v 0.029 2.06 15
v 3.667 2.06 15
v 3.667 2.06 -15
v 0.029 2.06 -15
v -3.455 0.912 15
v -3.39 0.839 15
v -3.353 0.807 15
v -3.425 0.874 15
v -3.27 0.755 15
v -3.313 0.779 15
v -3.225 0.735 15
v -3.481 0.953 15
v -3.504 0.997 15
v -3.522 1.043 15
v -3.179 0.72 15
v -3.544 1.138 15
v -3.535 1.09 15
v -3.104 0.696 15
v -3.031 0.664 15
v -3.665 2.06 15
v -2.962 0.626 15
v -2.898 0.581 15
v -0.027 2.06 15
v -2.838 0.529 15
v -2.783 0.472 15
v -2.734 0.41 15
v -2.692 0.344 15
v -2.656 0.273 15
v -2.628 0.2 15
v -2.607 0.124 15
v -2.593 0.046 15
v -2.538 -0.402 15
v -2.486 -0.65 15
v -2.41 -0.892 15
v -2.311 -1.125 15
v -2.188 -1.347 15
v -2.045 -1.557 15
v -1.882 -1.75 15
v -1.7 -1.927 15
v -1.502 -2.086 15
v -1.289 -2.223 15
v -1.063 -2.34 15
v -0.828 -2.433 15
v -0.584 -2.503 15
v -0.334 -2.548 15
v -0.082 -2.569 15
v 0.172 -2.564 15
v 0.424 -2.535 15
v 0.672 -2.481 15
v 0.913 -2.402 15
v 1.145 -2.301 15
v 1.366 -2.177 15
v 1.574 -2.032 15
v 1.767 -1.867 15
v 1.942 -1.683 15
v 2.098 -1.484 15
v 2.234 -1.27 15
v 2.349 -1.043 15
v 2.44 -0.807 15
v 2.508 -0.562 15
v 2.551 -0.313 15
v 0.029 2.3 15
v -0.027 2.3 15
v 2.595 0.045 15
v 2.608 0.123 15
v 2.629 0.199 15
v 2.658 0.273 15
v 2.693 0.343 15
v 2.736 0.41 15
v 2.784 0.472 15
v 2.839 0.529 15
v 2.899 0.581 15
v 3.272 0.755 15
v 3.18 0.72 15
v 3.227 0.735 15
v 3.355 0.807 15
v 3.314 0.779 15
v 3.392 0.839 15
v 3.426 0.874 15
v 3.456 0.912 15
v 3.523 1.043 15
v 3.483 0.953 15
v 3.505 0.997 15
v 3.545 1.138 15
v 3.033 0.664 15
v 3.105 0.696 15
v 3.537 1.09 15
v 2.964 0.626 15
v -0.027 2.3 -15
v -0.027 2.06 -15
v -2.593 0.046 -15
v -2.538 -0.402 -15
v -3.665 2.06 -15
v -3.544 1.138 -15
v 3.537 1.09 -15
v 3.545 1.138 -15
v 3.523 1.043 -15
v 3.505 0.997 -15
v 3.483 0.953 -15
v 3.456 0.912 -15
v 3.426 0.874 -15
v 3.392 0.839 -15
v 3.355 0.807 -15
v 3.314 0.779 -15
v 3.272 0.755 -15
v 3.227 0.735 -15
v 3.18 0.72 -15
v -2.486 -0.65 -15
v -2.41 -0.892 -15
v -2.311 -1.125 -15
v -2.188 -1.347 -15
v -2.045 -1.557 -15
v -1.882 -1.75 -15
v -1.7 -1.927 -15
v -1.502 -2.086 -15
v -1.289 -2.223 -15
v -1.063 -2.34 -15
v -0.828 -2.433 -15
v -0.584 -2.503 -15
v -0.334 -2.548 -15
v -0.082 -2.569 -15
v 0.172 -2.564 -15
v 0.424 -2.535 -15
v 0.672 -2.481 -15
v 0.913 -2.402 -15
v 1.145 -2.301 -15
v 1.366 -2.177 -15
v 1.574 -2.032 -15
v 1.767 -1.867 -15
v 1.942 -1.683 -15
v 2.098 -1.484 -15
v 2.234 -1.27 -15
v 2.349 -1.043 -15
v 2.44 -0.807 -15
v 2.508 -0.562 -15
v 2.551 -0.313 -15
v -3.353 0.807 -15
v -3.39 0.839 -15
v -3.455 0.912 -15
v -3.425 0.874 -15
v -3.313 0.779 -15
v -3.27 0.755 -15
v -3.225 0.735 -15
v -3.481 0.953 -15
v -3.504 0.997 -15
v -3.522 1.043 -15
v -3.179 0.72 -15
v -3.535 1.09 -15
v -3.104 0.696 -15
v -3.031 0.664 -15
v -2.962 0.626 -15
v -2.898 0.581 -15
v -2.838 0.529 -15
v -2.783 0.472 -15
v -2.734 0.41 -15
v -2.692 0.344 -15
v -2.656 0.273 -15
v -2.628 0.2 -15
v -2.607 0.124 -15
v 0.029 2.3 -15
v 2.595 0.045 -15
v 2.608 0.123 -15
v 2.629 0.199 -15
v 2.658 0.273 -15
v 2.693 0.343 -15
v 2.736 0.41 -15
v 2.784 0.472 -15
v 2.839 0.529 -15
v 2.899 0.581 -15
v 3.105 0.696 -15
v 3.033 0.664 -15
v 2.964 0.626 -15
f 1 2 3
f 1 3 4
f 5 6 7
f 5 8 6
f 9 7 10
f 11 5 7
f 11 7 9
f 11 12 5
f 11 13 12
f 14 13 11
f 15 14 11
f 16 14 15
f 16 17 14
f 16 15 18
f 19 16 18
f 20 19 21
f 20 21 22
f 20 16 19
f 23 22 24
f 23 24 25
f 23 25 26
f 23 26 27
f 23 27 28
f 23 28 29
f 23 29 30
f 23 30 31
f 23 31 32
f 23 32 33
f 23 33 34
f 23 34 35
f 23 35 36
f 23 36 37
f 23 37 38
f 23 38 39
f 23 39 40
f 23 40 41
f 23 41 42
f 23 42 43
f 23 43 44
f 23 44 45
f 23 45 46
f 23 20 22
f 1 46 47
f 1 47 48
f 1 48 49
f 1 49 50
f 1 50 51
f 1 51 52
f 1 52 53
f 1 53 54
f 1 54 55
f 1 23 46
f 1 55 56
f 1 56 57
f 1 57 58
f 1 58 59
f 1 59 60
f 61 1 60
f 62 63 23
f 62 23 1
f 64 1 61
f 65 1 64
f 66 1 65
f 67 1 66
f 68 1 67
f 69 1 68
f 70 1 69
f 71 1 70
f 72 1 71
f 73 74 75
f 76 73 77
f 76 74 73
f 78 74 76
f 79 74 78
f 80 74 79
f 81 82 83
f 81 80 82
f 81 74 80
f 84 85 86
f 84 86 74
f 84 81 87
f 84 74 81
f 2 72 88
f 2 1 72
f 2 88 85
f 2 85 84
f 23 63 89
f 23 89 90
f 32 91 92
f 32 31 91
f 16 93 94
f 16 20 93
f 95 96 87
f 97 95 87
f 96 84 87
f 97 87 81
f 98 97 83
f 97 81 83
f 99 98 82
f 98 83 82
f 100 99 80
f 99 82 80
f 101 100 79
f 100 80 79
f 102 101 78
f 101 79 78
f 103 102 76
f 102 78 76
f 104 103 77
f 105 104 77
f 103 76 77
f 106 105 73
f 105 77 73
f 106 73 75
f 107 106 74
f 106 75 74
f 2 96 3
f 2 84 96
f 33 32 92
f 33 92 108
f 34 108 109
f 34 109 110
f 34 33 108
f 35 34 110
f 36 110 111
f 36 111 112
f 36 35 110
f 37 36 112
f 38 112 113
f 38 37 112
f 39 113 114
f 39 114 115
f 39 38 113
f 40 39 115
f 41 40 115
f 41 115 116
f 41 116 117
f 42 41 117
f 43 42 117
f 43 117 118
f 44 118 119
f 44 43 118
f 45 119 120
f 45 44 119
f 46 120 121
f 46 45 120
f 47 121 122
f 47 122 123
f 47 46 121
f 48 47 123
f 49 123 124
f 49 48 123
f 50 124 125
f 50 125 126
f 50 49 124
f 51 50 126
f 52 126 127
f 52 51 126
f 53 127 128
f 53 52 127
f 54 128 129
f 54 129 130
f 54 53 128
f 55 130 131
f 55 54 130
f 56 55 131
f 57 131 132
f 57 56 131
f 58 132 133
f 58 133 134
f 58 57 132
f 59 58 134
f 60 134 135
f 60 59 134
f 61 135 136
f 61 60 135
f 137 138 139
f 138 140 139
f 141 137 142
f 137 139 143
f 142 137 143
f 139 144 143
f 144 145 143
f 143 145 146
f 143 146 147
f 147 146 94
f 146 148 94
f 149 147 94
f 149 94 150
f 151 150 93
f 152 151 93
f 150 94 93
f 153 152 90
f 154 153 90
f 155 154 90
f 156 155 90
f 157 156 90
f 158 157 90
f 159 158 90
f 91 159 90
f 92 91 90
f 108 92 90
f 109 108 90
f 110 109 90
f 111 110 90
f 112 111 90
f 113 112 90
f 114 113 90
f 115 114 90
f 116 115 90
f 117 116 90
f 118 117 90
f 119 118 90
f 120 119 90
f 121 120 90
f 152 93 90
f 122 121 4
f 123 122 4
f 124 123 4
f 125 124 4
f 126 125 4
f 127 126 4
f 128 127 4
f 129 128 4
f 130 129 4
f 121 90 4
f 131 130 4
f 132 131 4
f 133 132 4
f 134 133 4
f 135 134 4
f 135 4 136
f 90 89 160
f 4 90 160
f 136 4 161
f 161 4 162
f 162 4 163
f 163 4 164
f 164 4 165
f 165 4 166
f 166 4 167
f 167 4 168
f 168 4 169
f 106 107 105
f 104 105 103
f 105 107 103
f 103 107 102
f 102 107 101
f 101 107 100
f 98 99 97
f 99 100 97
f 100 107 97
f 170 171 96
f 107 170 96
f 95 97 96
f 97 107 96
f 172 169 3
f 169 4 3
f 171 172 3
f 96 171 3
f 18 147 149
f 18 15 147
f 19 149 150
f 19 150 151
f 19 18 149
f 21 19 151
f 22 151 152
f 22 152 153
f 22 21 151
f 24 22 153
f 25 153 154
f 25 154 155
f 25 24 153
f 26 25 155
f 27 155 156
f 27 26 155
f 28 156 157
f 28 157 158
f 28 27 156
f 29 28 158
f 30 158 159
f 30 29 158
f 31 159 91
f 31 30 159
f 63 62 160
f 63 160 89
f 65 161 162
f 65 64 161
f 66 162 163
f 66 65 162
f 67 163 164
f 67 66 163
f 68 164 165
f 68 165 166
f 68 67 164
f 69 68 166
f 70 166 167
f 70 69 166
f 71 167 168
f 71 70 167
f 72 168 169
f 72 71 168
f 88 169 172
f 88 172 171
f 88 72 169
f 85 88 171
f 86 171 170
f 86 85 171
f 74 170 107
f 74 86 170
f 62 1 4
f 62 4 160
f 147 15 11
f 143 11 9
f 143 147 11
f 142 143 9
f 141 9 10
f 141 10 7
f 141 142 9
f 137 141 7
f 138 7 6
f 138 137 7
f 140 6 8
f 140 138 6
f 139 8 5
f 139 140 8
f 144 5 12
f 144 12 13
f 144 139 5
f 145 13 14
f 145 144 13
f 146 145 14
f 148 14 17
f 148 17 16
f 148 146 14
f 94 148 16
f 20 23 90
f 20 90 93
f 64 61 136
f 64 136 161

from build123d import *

# Parameters (mm, degrees)
EXTRUDE1_DEPTH = 15
FILLET1_R      = 0.5


with BuildPart() as part:
    # Sketch2 → Extrude1 (new, symmetric)
    with BuildSketch(Plane.XY):
        with BuildLine():
            Line((-2.593415235, 0.045802636), (-2.538323026, -0.401884053))
            ThreePointArc((-2.538323026, -0.401884053), (0.045183933, -2.569603849), (2.550988586, -0.312512721))
            Line((2.550988586, -0.312512721), (2.594832844, 0.045372131))
            ThreePointArc((2.594832844, 0.045372131), (2.899006177, 0.58055361), (3.493240793, 0.741257846))
            Line((3.493240793, 0.741257846), (3.666713736, 2.059896211))
            Line((3.666713736, 2.059896211), (0.028937175, 2.059896211))
            Line((0.028937175, 2.059896211), (0.028937175, 2.258712577))
            Line((0.028937175, 2.258712577), (0.028937175, 2.299985842))
            Line((0.028937175, 2.299985842), (-0.027466707, 2.299985842))
            Line((-0.027466707, 2.299985842), (-0.027466707, 2.258712577))
            Line((-0.027466707, 2.258712577), (-0.027466707, 2.059896211))
            Line((-0.027466707, 2.059896211), (-3.665243268, 2.059896211))
            Line((-3.665243268, 2.059896211), (-3.491770325, 0.741257846))
            ThreePointArc((-3.491770325, 0.741257846), (-2.897707177, 0.580686389), (-2.593415235, 0.045802636))
        make_face()
    extrude(amount=EXTRUDE1_DEPTH, both=True)

    # Fillet1
    fillet1_edges = [part.edges().sort_by_distance(p)[0] for p in [
        (-3.491770325, 0.741257846, 0),
        (3.493240793, 0.741257846, 0),
    ]]
    fillet(fillet1_edges, radius=FILLET1_R)


solid = part.part
